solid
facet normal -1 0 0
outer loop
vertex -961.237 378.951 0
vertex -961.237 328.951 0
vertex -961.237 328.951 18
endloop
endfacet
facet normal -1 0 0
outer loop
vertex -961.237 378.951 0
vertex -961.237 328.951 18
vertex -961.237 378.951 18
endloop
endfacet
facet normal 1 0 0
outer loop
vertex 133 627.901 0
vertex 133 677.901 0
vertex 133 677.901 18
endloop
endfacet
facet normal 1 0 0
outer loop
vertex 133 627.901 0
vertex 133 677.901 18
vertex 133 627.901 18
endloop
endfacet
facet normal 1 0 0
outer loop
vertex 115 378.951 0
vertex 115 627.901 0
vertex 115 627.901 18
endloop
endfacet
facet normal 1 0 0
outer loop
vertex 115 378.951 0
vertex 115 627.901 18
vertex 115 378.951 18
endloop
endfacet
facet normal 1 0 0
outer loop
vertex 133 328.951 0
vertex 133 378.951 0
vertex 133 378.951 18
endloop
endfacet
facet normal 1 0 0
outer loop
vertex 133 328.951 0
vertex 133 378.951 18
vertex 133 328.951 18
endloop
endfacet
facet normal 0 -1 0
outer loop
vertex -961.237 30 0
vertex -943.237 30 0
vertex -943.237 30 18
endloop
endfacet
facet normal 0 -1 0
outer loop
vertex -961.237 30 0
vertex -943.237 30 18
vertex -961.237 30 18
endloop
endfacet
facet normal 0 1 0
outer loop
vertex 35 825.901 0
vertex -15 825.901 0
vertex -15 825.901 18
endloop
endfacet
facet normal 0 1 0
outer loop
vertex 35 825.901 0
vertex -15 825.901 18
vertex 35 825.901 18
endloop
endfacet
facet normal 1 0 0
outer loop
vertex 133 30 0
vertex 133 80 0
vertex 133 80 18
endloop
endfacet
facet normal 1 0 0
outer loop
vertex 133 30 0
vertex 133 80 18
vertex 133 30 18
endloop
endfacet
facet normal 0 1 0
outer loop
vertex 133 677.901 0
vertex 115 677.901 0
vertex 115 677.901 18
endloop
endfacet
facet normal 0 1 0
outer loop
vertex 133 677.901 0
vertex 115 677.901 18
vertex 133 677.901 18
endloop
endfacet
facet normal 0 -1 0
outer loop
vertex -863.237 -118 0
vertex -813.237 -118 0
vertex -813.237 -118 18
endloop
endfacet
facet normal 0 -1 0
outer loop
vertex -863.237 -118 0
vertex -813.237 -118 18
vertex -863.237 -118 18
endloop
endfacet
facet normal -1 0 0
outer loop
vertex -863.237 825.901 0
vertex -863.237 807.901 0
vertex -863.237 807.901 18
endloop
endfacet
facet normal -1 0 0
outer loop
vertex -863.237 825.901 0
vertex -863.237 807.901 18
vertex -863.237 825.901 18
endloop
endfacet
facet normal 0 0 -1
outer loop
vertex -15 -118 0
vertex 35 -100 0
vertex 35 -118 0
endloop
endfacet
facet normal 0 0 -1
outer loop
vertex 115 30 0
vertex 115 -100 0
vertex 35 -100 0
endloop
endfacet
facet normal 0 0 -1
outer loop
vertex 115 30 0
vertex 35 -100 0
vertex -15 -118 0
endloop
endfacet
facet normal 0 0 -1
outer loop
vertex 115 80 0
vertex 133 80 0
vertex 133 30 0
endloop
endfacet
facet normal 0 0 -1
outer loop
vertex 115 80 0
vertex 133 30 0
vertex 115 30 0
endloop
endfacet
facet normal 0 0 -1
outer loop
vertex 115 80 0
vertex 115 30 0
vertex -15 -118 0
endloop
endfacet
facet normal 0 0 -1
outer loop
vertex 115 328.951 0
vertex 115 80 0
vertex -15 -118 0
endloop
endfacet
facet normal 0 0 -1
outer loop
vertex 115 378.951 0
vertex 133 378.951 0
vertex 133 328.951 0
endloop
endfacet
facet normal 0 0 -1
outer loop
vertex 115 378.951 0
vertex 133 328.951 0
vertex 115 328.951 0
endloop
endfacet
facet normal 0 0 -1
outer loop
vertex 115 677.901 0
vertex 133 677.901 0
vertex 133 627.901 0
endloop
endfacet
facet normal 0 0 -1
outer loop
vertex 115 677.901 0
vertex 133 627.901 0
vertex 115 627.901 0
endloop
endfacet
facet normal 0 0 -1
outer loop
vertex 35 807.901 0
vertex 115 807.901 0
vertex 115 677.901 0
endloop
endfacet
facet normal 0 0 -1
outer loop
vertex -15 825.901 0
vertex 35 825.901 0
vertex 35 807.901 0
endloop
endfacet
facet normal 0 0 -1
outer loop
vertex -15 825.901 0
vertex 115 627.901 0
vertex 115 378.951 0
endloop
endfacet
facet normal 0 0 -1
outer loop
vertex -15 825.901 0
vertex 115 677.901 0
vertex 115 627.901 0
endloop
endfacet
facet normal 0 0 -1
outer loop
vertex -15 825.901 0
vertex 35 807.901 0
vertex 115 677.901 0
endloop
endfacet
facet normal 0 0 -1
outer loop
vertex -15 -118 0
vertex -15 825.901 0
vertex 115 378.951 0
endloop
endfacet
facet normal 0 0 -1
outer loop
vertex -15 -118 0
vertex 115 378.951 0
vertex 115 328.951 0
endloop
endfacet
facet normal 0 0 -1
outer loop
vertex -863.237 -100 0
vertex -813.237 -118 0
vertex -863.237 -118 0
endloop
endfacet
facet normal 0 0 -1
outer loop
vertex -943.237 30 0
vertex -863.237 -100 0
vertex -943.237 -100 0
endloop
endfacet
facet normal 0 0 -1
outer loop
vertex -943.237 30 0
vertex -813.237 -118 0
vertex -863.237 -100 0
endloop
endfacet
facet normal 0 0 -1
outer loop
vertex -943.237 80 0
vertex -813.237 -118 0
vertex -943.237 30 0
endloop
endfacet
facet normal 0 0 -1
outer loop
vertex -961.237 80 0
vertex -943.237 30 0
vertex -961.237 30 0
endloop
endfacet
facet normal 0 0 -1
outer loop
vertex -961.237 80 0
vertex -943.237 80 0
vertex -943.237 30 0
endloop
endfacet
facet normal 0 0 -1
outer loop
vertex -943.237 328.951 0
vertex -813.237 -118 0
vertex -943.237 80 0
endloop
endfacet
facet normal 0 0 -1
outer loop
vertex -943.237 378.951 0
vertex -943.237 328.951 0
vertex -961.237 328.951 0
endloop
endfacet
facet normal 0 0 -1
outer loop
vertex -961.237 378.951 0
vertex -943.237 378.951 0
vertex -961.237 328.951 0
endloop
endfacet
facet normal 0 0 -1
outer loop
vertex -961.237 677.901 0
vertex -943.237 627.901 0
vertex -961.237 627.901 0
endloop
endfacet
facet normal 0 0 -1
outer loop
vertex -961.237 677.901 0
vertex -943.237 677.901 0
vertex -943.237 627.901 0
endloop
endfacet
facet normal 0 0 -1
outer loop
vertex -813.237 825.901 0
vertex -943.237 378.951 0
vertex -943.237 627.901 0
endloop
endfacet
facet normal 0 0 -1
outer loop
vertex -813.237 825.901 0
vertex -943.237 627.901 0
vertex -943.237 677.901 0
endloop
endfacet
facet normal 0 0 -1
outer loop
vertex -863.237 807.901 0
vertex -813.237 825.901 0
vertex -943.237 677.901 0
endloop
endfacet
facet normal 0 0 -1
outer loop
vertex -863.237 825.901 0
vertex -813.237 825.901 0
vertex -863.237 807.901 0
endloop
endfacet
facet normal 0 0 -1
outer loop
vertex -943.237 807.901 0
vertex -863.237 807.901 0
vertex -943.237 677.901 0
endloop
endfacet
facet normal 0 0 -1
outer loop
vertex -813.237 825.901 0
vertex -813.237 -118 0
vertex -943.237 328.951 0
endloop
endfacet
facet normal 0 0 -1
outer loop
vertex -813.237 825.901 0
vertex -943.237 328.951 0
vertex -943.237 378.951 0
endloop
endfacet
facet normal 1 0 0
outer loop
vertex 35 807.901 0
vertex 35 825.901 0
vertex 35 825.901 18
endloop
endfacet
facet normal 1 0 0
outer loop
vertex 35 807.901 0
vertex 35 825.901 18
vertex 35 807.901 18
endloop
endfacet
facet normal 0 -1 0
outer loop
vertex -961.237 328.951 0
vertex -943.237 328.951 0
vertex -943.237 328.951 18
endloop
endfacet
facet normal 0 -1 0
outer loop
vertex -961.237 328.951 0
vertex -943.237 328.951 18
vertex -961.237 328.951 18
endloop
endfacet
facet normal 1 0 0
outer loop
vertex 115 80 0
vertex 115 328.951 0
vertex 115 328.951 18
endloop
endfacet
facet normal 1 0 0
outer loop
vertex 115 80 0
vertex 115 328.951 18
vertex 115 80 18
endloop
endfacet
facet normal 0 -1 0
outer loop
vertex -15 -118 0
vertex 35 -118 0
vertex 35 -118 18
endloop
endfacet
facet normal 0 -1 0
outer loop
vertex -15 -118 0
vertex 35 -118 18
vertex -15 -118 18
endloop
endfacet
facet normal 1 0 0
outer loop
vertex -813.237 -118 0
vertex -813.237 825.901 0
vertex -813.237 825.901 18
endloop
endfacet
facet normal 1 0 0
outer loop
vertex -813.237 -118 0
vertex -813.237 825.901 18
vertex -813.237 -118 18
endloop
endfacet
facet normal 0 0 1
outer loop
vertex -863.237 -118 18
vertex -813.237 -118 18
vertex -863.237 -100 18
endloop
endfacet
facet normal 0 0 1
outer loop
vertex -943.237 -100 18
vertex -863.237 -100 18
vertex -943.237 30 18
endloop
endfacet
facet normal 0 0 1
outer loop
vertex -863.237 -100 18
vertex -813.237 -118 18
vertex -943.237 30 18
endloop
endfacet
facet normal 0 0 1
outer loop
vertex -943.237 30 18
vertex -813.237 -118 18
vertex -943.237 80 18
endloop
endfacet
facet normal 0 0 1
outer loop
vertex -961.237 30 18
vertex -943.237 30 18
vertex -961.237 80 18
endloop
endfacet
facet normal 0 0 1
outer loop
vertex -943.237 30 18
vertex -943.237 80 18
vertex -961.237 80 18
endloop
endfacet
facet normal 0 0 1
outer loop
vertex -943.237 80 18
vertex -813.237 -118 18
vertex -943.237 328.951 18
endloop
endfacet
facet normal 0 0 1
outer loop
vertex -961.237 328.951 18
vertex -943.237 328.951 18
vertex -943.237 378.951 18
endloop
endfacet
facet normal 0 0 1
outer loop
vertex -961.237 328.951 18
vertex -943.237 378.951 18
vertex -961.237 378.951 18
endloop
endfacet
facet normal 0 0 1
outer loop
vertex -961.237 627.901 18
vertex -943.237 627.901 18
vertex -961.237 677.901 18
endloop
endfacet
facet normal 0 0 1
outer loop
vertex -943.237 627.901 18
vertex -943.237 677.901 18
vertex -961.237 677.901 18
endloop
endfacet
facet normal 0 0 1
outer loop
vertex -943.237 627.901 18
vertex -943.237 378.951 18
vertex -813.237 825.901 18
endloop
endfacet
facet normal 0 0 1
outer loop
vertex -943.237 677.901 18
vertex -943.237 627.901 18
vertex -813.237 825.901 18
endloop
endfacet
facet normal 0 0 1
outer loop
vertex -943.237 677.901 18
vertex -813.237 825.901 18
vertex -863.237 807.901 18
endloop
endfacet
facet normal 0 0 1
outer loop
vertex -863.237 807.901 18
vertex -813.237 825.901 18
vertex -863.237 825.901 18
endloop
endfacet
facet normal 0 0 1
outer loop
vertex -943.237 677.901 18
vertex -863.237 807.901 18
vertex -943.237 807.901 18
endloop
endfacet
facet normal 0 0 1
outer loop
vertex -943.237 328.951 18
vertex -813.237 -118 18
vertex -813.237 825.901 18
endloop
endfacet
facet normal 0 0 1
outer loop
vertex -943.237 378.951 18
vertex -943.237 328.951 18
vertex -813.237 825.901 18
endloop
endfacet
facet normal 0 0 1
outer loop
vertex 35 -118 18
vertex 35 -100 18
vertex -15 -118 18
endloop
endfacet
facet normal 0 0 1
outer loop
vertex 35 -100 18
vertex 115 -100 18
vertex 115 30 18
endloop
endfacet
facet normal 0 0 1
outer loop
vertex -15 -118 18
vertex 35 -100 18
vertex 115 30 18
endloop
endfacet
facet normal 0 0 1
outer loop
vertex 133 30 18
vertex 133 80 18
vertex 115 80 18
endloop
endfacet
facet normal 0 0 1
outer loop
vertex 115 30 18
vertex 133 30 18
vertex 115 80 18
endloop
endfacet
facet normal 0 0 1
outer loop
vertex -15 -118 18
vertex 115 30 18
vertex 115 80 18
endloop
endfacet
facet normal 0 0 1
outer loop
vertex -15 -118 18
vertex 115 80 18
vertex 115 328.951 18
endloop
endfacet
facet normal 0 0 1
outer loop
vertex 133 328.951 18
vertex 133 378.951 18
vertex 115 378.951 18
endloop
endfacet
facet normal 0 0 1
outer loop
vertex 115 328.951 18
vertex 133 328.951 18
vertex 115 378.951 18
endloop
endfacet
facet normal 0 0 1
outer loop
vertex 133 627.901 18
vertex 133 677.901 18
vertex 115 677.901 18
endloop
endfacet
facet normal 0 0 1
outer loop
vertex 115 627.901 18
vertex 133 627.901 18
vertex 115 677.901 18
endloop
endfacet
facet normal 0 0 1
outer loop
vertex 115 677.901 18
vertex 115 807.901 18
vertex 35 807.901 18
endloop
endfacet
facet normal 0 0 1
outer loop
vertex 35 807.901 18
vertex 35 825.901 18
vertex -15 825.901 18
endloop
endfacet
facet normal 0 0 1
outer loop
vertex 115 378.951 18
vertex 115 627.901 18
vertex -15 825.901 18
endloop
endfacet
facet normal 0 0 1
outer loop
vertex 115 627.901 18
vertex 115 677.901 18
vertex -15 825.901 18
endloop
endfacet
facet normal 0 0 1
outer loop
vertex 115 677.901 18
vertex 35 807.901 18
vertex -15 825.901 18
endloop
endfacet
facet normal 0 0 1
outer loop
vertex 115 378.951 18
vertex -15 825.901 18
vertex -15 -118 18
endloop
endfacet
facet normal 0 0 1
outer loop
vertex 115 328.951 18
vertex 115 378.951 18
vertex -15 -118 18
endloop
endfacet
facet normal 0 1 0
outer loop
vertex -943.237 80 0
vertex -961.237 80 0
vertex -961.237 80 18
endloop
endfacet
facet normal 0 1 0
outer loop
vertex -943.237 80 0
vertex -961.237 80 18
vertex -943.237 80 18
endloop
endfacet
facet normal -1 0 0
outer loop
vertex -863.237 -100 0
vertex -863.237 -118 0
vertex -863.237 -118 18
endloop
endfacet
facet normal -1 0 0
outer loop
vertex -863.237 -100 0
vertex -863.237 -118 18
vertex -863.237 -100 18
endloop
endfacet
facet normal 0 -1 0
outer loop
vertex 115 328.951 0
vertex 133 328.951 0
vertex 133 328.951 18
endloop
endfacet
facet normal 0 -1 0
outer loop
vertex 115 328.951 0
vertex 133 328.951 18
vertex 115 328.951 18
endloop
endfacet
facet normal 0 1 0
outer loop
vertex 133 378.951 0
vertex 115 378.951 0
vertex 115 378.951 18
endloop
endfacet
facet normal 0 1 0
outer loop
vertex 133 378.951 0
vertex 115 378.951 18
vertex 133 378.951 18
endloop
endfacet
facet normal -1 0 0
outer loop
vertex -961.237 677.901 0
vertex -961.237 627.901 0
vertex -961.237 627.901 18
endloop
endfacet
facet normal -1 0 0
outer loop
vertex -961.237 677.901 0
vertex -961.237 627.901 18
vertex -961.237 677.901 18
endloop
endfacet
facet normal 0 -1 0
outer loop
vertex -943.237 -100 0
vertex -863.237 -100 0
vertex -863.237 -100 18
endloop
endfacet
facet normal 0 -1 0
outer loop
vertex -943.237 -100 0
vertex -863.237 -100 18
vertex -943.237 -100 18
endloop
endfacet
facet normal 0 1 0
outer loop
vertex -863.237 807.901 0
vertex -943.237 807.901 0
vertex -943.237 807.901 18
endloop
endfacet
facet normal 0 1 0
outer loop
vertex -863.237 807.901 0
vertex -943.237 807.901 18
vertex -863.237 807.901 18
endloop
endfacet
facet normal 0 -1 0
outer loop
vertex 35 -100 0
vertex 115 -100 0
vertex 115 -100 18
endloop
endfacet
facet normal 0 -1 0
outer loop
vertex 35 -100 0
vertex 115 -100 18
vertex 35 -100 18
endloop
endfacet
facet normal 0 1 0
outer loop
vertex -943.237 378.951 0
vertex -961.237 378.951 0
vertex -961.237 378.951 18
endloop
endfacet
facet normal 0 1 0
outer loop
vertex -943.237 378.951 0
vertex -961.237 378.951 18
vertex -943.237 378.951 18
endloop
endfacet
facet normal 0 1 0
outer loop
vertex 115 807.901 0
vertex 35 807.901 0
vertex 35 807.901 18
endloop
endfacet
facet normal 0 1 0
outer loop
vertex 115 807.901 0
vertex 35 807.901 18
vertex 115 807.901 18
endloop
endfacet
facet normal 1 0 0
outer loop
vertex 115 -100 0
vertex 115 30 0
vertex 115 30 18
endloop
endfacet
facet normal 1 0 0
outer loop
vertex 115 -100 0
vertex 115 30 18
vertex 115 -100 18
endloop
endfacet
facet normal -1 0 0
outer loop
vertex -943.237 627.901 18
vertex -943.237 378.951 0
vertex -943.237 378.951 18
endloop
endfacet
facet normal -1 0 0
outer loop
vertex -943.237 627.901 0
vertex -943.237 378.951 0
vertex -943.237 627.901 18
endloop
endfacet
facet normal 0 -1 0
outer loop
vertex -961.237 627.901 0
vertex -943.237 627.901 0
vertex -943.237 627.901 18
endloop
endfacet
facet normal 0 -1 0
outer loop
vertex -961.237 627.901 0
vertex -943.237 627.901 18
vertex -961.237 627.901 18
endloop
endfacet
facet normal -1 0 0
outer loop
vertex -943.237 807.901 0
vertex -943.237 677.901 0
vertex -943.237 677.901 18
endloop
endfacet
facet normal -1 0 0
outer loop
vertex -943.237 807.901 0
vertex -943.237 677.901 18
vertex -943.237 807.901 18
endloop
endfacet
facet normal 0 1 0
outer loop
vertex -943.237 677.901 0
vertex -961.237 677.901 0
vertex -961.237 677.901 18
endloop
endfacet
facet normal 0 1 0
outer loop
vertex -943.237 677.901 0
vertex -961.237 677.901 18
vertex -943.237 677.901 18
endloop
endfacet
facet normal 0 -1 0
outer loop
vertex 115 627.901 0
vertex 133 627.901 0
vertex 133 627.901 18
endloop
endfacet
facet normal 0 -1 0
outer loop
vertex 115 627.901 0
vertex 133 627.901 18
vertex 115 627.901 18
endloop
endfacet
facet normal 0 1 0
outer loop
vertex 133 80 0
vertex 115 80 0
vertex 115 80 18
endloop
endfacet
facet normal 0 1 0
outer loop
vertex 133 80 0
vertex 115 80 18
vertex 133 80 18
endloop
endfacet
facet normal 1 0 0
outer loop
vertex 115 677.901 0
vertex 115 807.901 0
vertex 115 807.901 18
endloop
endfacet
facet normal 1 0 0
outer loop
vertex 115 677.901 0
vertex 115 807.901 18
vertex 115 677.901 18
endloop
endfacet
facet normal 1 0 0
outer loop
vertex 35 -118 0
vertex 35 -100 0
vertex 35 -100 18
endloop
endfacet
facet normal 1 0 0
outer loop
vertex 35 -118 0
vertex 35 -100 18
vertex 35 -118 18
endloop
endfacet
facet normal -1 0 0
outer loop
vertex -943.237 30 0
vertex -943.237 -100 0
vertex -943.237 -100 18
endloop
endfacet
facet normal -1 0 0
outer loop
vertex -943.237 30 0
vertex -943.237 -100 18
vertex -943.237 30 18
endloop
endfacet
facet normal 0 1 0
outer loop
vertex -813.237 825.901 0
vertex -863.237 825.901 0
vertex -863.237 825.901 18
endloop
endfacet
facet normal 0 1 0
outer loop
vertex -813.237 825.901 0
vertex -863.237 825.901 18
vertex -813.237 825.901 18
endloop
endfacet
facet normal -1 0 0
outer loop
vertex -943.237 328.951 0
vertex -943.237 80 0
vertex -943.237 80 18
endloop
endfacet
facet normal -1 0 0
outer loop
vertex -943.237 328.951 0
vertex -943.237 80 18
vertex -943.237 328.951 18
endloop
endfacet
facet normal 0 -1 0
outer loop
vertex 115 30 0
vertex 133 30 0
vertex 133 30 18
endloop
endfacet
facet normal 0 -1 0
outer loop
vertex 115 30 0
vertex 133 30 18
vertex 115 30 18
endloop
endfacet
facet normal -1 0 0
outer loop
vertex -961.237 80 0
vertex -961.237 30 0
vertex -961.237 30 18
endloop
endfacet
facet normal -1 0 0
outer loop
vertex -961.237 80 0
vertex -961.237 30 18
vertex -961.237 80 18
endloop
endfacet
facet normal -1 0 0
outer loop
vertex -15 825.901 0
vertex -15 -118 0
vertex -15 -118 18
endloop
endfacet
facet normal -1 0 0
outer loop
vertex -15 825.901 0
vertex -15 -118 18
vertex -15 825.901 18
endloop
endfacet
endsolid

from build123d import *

# Parameters (mm, degrees)
BOSS_EXTRUDE1_DEPTH = 18
CUT_EXTRUDE1_DEPTH  = 1268.443443295


with BuildPart() as part:
    # Sketch1 → Boss-Extrude1 (new body)
    with BuildSketch(Plane.XY):
        Polygon((-961.236516538, 328.950735931), (-961.236516538, 378.950735931), (-943.236516538, 378.950735931), (-943.236516538, 627.901471863), (-961.236516538, 627.901471863), (-961.236516538, 677.901471863), (-943.236516538, 677.901471863), (-943.236516538, 807.901471863), (-863.236516538, 807.901471863), (-863.236516538, 825.901471863), (-813.236516538, 825.901471863), (-813.236516538, 807.901471863), (-439.118258269, 807.901471863), (-439.118258269, 825.901471863), (-389.118258269, 825.901471863), (-389.118258269, 807.901471863), (-15, 807.901471863), (-15, 825.901471863), (35, 825.901471863), (35, 807.901471863), (115, 807.901471863), (115, 677.901471863), (133, 677.901471863), (133, 627.901471863), (115, 627.901471863), (115, 378.950735931), (133, 378.950735931), (133, 328.950735931), (115, 328.950735931), (115, 80), (133, 80), (133, 30), (115, 30), (115, -100), (35, -100), (35, -118), (-15, -118), (-15, -100), (-389.118258269, -100), (-389.118258269, -118), (-439.118258269, -118), (-439.118258269, -100), (-813.236516538, -100), (-813.236516538, -118), (-863.236516538, -118), (-863.236516538, -100), (-943.236516538, -100), (-943.236516538, 30), (-961.236516538, 30), (-961.236516538, 80), (-943.236516538, 80), (-943.236516538, 328.950735931), align=None)
    extrude(amount=BOSS_EXTRUDE1_DEPTH)

    # Sketch2 → Cut-Extrude1 (cut, through all)
    with BuildSketch(Plane(origin=(0, 0, 0), x_dir=(-1, 0, 0), z_dir=(0, 0, -1))):
        Polygon((389.118258269, -100), (389.118258269, -118), (439.118258269, -118), (439.118258269, -100), (813.236516538, -100), (813.236516538, 807.901471863), (439.118258269, 807.901471863), (439.118258269, 825.901471863), (389.118258269, 825.901471863), (389.118258269, 807.901471863), (15, 807.901471863), (15, -100), align=None)
    extrude(amount=-CUT_EXTRUDE1_DEPTH, mode=Mode.SUBTRACT)


with BuildPart() as cut_extrude1_piece_1:
    # of the separate pieces the step leaves, piece 1, a body of its own (cut_extrude1_pieces)
    add(part.part.solids().sort_by_distance((-15, -118, 0))[0])


with BuildPart() as cut_extrude1_piece_2:
    # of the separate pieces the step leaves, piece 2, a body of its own (cut_extrude1_pieces)
    add(part.part.solids().sort_by_distance((-961.236516538, 328.950735931, 0))[0])


solid = Compound([cut_extrude1_piece_1.part, cut_extrude1_piece_2.part])
